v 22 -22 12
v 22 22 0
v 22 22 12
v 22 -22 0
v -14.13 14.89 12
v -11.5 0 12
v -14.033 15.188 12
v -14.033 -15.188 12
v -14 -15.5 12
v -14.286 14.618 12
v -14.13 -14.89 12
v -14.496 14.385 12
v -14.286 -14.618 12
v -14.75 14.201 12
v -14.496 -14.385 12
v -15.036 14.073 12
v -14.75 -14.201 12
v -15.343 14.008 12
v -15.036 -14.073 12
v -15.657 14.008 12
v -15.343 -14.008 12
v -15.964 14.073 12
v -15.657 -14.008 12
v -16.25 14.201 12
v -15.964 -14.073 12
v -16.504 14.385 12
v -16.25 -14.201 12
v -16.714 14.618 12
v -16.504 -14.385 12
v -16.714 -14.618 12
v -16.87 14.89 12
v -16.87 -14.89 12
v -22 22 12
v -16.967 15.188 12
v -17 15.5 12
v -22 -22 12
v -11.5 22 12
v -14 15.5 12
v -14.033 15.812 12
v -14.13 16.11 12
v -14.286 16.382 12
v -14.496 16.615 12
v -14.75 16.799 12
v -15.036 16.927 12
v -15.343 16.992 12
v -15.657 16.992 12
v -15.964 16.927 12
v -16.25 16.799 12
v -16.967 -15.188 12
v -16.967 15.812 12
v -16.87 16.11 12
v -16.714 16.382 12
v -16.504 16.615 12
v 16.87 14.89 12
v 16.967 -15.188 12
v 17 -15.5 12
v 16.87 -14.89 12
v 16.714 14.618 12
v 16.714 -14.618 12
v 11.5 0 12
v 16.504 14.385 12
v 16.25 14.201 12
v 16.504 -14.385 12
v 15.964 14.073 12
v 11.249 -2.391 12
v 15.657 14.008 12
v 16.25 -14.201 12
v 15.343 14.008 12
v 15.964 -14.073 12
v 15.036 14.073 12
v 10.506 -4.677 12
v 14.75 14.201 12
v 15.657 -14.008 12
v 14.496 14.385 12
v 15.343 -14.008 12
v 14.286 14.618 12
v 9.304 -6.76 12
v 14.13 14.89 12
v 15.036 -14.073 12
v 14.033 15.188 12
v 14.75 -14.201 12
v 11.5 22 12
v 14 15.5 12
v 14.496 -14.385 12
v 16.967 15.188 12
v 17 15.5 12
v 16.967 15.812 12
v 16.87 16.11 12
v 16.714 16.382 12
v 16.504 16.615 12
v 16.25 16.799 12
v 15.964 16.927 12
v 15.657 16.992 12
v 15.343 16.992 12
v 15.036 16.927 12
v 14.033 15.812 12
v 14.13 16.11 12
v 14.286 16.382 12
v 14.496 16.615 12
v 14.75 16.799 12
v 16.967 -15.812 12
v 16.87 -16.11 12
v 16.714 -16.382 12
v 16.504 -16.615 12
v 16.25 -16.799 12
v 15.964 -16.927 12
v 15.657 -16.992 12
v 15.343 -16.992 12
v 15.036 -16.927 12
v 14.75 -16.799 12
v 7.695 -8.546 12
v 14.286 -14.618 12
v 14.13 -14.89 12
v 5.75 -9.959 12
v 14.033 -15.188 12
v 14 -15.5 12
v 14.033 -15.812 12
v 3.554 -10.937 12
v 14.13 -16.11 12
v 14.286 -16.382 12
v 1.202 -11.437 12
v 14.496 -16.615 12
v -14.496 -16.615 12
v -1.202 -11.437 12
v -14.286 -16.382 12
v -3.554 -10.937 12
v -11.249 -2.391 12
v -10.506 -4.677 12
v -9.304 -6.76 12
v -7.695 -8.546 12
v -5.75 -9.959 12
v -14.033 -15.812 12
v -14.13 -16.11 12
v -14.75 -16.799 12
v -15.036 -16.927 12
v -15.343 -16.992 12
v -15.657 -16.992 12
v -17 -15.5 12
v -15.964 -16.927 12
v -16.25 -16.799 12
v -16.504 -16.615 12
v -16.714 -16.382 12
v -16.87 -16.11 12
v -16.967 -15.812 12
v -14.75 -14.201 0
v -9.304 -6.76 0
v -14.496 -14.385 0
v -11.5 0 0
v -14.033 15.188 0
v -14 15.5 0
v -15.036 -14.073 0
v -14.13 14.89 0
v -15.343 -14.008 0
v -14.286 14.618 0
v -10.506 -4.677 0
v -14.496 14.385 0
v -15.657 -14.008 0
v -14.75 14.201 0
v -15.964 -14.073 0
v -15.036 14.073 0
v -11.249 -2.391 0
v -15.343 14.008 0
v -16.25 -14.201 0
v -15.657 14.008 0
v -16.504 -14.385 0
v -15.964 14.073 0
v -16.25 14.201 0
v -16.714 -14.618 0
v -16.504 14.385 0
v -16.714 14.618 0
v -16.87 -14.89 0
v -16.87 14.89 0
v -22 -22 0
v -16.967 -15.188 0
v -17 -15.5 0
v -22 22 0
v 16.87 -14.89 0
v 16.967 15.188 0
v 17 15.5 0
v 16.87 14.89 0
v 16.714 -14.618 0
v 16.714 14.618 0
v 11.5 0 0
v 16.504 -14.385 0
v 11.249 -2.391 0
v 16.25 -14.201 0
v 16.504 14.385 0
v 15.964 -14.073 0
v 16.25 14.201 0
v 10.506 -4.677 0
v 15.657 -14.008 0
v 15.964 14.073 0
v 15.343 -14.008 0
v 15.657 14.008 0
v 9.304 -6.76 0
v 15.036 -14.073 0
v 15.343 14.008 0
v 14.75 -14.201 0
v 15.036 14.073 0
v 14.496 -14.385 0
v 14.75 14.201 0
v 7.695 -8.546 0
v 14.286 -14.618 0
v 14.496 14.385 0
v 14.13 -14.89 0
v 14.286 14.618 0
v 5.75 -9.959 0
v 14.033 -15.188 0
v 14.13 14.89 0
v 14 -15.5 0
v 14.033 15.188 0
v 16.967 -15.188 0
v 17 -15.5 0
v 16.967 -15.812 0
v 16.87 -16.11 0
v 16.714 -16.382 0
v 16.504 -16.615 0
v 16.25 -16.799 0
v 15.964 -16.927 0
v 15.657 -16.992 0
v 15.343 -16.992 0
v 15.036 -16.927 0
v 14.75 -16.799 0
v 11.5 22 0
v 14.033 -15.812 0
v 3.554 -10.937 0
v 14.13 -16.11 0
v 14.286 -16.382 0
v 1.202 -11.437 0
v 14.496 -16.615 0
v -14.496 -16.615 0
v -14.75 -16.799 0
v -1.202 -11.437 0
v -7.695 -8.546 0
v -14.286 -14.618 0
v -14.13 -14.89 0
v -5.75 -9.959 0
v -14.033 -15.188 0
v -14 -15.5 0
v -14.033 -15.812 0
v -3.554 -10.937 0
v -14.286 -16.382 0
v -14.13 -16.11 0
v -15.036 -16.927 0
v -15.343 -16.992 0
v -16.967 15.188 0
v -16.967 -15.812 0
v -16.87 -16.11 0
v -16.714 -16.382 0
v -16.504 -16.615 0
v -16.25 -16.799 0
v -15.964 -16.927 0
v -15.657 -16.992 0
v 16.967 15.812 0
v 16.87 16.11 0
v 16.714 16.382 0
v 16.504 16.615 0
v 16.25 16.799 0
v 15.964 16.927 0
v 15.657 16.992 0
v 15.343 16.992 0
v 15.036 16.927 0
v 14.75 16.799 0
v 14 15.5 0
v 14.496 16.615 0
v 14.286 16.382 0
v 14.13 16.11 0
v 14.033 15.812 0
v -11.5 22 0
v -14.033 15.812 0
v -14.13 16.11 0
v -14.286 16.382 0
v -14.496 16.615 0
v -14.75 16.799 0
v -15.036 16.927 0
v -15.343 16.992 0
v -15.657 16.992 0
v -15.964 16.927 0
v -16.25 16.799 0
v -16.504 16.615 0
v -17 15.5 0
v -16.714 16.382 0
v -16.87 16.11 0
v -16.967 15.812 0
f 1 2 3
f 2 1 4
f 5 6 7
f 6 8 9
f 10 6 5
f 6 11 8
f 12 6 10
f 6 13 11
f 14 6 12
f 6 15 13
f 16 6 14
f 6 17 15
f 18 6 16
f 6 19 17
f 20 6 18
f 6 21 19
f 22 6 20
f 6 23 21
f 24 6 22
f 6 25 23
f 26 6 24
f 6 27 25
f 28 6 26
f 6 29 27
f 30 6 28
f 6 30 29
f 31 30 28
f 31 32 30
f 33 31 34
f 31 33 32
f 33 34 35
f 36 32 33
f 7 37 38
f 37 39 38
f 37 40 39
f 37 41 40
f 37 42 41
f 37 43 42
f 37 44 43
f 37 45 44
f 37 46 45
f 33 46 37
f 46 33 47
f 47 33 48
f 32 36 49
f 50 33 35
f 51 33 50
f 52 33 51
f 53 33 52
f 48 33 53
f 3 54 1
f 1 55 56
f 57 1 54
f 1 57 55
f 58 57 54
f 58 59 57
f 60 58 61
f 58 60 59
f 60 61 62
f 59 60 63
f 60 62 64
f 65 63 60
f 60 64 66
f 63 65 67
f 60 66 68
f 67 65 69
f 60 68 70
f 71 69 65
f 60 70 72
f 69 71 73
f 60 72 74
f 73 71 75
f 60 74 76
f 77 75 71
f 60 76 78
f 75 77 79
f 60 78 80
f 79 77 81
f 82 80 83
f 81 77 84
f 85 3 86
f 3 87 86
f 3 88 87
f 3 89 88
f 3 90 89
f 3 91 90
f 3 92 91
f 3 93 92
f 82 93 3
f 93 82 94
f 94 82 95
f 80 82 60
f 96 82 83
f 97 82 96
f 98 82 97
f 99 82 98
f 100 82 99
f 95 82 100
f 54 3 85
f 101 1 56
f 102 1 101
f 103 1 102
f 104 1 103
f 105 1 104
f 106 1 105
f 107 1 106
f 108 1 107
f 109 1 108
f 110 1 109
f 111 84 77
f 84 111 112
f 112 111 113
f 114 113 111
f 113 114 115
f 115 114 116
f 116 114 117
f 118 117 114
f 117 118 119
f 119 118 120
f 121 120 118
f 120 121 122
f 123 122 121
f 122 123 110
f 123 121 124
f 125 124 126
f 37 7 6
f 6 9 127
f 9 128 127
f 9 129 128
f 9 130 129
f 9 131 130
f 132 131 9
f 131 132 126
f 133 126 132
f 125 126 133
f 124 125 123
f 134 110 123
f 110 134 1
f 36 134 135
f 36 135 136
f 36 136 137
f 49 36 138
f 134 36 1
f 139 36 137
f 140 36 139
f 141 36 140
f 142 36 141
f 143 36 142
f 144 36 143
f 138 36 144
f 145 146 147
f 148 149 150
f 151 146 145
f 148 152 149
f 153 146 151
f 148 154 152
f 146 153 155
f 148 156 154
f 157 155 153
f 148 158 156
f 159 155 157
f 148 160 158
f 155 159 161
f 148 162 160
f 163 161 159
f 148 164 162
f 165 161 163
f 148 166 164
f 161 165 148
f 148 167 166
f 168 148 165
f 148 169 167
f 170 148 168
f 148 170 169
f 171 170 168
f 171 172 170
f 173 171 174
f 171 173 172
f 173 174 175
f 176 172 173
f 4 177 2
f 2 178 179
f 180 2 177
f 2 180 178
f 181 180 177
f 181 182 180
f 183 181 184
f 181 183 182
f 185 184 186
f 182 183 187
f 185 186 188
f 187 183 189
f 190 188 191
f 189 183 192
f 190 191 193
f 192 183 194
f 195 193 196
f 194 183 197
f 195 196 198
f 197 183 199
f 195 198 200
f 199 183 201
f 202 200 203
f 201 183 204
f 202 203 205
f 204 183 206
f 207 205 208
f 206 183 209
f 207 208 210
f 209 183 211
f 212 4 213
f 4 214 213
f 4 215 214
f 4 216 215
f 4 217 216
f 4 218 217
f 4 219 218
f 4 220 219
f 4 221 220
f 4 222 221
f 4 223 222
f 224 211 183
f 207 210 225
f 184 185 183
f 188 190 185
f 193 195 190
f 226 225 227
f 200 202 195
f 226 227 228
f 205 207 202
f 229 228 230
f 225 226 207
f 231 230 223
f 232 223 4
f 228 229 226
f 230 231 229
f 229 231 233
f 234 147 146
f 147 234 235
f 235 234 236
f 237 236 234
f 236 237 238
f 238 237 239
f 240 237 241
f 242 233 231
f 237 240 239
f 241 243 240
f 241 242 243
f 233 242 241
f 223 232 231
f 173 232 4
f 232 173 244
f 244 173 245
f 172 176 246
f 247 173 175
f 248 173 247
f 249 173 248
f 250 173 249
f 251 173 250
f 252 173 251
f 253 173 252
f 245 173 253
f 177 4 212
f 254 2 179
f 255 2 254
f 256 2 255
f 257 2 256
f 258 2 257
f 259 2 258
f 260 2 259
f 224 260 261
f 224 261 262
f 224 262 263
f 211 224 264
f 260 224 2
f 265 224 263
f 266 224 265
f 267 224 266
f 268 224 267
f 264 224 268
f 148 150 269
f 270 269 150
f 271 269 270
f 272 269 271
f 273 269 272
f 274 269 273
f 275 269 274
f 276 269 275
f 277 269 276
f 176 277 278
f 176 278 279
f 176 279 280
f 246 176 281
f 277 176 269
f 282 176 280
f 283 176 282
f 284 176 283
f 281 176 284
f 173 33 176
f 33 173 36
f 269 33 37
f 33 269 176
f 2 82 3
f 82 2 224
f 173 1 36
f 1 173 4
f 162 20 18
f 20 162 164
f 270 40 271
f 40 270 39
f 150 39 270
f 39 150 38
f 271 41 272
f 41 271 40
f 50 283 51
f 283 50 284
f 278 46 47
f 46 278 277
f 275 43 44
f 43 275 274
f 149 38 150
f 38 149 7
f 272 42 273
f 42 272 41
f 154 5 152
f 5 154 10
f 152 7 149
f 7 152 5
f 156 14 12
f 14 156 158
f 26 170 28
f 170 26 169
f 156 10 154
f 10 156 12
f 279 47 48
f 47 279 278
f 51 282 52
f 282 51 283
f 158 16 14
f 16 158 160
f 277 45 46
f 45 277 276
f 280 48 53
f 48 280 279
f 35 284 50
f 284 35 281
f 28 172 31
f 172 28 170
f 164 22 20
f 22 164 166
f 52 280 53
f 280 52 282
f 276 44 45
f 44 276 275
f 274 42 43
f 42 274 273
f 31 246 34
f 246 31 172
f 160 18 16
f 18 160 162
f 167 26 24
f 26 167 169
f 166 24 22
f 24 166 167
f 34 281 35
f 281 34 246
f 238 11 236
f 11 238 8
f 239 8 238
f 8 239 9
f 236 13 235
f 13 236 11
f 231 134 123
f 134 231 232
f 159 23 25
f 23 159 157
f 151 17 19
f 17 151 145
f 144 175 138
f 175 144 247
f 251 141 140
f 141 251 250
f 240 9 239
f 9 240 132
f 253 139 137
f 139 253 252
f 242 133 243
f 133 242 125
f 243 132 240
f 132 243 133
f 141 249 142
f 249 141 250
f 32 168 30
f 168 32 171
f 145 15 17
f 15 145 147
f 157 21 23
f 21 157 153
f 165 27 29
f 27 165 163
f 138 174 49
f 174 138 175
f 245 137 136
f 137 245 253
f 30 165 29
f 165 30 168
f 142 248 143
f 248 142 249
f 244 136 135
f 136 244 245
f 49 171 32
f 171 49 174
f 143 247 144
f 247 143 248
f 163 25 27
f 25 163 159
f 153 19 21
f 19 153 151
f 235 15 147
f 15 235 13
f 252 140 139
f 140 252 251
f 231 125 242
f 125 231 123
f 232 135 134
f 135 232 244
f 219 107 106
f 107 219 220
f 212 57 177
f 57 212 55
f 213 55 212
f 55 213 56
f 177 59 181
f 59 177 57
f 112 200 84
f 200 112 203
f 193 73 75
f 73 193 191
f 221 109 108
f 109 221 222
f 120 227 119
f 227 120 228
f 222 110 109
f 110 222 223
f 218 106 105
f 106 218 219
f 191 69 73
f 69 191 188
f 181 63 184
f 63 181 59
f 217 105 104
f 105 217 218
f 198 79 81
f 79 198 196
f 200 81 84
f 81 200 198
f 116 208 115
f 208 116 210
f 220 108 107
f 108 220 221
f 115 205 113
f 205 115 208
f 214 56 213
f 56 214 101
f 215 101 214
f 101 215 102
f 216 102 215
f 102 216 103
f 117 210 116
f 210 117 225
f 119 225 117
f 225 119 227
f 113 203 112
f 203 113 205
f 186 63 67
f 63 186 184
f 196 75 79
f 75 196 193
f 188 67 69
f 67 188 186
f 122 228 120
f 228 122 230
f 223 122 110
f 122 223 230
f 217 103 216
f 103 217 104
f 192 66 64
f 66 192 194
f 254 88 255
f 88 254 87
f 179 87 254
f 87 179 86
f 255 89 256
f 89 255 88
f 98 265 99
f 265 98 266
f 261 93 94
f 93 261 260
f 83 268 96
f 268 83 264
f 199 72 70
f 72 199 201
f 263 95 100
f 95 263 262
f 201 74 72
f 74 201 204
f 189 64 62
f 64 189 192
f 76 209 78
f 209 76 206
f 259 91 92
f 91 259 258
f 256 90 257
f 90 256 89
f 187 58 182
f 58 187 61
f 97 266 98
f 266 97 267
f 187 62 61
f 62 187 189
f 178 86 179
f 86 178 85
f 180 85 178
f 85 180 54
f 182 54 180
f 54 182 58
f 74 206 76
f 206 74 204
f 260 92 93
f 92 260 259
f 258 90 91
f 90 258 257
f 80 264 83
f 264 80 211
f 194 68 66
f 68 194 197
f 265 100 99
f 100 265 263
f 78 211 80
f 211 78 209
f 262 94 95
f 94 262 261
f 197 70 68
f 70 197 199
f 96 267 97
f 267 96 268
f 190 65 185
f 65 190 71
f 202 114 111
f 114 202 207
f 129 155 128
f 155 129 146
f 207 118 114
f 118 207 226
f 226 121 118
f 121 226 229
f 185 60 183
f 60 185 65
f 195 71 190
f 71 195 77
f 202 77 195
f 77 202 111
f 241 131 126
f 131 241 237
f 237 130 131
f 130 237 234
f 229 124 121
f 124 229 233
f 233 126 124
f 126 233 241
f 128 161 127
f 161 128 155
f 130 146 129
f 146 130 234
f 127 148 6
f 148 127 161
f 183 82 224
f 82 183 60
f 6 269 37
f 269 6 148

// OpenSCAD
z_mellan = 160;
z_y = 22;
z_d = 12.6;
z_hole = 15;

nema_xy = 44;
nema_screw = 31;
nema_c = 23;
screw = 3;
screw_distance = 100;
wall = 3;
h = 12;
ply = 8;

difference() {
    union() {
        difference() {
            
        }
        hull() {
            //translate([z_mellan/2,0,0]) cylinder(d=z_d+wall*2, h=h, $fn=30);
            //translate([-z_mellan/2,0,0]) cylinder(d=z_d+wall*2, h=h, $fn=30);
            
            //translate([-z_mellan/2-wall/2-z_d/2,0,0]) cube([z_mellan+wall+z_d,z_y,h]);
            
        }
        //nema platta
        translate([-nema_xy/2,-nema_xy/2,0]) cube([nema_xy, nema_xy, h]);
        //uppstickande hål
        //translate([z_mellan/2,0,0]) cylinder(d=z_hole, h=h+ply, $fn=30);
        //translate([-z_mellan/2,0,0]) cylinder(d=z_hole, h=h+ply, $fn=30);
    }
    translate([screw_distance/2,0,-1]) cylinder(d=screw, h=h*3, $fn=30);
    translate([-screw_distance/2,0,-1]) cylinder(d=screw, h=h*3, $fn=30);
    translate([z_mellan/2,0,h]) cylinder(d=z_d, h=h*3+ply, $fn=30);
    translate([-z_mellan/2,0,h]) cylinder(d=z_d, h=h*3+ply, $fn=30);
    
    //nema hål
    translate([-nema_screw/2,nema_screw/2,-1]) cylinder(d=screw, h=h*3, $fn=30);
    translate([-nema_screw/2,-nema_screw/2,-1]) cylinder(d=screw, h=h*3, $fn=30);
    translate([nema_screw/2,-nema_screw/2,-1]) cylinder(d=screw, h=h*3, $fn=30);
    translate([nema_screw/2,nema_screw/2,-1]) cylinder(d=screw, h=h*3, $fn=30);
    translate([0,0,-1]) cylinder(d=nema_c, h=h*3, $fn=30);
    
    //remhål
    translate([-nema_c/2,0,-1]) cube([nema_c,nema_c,h*2]);
    
}
